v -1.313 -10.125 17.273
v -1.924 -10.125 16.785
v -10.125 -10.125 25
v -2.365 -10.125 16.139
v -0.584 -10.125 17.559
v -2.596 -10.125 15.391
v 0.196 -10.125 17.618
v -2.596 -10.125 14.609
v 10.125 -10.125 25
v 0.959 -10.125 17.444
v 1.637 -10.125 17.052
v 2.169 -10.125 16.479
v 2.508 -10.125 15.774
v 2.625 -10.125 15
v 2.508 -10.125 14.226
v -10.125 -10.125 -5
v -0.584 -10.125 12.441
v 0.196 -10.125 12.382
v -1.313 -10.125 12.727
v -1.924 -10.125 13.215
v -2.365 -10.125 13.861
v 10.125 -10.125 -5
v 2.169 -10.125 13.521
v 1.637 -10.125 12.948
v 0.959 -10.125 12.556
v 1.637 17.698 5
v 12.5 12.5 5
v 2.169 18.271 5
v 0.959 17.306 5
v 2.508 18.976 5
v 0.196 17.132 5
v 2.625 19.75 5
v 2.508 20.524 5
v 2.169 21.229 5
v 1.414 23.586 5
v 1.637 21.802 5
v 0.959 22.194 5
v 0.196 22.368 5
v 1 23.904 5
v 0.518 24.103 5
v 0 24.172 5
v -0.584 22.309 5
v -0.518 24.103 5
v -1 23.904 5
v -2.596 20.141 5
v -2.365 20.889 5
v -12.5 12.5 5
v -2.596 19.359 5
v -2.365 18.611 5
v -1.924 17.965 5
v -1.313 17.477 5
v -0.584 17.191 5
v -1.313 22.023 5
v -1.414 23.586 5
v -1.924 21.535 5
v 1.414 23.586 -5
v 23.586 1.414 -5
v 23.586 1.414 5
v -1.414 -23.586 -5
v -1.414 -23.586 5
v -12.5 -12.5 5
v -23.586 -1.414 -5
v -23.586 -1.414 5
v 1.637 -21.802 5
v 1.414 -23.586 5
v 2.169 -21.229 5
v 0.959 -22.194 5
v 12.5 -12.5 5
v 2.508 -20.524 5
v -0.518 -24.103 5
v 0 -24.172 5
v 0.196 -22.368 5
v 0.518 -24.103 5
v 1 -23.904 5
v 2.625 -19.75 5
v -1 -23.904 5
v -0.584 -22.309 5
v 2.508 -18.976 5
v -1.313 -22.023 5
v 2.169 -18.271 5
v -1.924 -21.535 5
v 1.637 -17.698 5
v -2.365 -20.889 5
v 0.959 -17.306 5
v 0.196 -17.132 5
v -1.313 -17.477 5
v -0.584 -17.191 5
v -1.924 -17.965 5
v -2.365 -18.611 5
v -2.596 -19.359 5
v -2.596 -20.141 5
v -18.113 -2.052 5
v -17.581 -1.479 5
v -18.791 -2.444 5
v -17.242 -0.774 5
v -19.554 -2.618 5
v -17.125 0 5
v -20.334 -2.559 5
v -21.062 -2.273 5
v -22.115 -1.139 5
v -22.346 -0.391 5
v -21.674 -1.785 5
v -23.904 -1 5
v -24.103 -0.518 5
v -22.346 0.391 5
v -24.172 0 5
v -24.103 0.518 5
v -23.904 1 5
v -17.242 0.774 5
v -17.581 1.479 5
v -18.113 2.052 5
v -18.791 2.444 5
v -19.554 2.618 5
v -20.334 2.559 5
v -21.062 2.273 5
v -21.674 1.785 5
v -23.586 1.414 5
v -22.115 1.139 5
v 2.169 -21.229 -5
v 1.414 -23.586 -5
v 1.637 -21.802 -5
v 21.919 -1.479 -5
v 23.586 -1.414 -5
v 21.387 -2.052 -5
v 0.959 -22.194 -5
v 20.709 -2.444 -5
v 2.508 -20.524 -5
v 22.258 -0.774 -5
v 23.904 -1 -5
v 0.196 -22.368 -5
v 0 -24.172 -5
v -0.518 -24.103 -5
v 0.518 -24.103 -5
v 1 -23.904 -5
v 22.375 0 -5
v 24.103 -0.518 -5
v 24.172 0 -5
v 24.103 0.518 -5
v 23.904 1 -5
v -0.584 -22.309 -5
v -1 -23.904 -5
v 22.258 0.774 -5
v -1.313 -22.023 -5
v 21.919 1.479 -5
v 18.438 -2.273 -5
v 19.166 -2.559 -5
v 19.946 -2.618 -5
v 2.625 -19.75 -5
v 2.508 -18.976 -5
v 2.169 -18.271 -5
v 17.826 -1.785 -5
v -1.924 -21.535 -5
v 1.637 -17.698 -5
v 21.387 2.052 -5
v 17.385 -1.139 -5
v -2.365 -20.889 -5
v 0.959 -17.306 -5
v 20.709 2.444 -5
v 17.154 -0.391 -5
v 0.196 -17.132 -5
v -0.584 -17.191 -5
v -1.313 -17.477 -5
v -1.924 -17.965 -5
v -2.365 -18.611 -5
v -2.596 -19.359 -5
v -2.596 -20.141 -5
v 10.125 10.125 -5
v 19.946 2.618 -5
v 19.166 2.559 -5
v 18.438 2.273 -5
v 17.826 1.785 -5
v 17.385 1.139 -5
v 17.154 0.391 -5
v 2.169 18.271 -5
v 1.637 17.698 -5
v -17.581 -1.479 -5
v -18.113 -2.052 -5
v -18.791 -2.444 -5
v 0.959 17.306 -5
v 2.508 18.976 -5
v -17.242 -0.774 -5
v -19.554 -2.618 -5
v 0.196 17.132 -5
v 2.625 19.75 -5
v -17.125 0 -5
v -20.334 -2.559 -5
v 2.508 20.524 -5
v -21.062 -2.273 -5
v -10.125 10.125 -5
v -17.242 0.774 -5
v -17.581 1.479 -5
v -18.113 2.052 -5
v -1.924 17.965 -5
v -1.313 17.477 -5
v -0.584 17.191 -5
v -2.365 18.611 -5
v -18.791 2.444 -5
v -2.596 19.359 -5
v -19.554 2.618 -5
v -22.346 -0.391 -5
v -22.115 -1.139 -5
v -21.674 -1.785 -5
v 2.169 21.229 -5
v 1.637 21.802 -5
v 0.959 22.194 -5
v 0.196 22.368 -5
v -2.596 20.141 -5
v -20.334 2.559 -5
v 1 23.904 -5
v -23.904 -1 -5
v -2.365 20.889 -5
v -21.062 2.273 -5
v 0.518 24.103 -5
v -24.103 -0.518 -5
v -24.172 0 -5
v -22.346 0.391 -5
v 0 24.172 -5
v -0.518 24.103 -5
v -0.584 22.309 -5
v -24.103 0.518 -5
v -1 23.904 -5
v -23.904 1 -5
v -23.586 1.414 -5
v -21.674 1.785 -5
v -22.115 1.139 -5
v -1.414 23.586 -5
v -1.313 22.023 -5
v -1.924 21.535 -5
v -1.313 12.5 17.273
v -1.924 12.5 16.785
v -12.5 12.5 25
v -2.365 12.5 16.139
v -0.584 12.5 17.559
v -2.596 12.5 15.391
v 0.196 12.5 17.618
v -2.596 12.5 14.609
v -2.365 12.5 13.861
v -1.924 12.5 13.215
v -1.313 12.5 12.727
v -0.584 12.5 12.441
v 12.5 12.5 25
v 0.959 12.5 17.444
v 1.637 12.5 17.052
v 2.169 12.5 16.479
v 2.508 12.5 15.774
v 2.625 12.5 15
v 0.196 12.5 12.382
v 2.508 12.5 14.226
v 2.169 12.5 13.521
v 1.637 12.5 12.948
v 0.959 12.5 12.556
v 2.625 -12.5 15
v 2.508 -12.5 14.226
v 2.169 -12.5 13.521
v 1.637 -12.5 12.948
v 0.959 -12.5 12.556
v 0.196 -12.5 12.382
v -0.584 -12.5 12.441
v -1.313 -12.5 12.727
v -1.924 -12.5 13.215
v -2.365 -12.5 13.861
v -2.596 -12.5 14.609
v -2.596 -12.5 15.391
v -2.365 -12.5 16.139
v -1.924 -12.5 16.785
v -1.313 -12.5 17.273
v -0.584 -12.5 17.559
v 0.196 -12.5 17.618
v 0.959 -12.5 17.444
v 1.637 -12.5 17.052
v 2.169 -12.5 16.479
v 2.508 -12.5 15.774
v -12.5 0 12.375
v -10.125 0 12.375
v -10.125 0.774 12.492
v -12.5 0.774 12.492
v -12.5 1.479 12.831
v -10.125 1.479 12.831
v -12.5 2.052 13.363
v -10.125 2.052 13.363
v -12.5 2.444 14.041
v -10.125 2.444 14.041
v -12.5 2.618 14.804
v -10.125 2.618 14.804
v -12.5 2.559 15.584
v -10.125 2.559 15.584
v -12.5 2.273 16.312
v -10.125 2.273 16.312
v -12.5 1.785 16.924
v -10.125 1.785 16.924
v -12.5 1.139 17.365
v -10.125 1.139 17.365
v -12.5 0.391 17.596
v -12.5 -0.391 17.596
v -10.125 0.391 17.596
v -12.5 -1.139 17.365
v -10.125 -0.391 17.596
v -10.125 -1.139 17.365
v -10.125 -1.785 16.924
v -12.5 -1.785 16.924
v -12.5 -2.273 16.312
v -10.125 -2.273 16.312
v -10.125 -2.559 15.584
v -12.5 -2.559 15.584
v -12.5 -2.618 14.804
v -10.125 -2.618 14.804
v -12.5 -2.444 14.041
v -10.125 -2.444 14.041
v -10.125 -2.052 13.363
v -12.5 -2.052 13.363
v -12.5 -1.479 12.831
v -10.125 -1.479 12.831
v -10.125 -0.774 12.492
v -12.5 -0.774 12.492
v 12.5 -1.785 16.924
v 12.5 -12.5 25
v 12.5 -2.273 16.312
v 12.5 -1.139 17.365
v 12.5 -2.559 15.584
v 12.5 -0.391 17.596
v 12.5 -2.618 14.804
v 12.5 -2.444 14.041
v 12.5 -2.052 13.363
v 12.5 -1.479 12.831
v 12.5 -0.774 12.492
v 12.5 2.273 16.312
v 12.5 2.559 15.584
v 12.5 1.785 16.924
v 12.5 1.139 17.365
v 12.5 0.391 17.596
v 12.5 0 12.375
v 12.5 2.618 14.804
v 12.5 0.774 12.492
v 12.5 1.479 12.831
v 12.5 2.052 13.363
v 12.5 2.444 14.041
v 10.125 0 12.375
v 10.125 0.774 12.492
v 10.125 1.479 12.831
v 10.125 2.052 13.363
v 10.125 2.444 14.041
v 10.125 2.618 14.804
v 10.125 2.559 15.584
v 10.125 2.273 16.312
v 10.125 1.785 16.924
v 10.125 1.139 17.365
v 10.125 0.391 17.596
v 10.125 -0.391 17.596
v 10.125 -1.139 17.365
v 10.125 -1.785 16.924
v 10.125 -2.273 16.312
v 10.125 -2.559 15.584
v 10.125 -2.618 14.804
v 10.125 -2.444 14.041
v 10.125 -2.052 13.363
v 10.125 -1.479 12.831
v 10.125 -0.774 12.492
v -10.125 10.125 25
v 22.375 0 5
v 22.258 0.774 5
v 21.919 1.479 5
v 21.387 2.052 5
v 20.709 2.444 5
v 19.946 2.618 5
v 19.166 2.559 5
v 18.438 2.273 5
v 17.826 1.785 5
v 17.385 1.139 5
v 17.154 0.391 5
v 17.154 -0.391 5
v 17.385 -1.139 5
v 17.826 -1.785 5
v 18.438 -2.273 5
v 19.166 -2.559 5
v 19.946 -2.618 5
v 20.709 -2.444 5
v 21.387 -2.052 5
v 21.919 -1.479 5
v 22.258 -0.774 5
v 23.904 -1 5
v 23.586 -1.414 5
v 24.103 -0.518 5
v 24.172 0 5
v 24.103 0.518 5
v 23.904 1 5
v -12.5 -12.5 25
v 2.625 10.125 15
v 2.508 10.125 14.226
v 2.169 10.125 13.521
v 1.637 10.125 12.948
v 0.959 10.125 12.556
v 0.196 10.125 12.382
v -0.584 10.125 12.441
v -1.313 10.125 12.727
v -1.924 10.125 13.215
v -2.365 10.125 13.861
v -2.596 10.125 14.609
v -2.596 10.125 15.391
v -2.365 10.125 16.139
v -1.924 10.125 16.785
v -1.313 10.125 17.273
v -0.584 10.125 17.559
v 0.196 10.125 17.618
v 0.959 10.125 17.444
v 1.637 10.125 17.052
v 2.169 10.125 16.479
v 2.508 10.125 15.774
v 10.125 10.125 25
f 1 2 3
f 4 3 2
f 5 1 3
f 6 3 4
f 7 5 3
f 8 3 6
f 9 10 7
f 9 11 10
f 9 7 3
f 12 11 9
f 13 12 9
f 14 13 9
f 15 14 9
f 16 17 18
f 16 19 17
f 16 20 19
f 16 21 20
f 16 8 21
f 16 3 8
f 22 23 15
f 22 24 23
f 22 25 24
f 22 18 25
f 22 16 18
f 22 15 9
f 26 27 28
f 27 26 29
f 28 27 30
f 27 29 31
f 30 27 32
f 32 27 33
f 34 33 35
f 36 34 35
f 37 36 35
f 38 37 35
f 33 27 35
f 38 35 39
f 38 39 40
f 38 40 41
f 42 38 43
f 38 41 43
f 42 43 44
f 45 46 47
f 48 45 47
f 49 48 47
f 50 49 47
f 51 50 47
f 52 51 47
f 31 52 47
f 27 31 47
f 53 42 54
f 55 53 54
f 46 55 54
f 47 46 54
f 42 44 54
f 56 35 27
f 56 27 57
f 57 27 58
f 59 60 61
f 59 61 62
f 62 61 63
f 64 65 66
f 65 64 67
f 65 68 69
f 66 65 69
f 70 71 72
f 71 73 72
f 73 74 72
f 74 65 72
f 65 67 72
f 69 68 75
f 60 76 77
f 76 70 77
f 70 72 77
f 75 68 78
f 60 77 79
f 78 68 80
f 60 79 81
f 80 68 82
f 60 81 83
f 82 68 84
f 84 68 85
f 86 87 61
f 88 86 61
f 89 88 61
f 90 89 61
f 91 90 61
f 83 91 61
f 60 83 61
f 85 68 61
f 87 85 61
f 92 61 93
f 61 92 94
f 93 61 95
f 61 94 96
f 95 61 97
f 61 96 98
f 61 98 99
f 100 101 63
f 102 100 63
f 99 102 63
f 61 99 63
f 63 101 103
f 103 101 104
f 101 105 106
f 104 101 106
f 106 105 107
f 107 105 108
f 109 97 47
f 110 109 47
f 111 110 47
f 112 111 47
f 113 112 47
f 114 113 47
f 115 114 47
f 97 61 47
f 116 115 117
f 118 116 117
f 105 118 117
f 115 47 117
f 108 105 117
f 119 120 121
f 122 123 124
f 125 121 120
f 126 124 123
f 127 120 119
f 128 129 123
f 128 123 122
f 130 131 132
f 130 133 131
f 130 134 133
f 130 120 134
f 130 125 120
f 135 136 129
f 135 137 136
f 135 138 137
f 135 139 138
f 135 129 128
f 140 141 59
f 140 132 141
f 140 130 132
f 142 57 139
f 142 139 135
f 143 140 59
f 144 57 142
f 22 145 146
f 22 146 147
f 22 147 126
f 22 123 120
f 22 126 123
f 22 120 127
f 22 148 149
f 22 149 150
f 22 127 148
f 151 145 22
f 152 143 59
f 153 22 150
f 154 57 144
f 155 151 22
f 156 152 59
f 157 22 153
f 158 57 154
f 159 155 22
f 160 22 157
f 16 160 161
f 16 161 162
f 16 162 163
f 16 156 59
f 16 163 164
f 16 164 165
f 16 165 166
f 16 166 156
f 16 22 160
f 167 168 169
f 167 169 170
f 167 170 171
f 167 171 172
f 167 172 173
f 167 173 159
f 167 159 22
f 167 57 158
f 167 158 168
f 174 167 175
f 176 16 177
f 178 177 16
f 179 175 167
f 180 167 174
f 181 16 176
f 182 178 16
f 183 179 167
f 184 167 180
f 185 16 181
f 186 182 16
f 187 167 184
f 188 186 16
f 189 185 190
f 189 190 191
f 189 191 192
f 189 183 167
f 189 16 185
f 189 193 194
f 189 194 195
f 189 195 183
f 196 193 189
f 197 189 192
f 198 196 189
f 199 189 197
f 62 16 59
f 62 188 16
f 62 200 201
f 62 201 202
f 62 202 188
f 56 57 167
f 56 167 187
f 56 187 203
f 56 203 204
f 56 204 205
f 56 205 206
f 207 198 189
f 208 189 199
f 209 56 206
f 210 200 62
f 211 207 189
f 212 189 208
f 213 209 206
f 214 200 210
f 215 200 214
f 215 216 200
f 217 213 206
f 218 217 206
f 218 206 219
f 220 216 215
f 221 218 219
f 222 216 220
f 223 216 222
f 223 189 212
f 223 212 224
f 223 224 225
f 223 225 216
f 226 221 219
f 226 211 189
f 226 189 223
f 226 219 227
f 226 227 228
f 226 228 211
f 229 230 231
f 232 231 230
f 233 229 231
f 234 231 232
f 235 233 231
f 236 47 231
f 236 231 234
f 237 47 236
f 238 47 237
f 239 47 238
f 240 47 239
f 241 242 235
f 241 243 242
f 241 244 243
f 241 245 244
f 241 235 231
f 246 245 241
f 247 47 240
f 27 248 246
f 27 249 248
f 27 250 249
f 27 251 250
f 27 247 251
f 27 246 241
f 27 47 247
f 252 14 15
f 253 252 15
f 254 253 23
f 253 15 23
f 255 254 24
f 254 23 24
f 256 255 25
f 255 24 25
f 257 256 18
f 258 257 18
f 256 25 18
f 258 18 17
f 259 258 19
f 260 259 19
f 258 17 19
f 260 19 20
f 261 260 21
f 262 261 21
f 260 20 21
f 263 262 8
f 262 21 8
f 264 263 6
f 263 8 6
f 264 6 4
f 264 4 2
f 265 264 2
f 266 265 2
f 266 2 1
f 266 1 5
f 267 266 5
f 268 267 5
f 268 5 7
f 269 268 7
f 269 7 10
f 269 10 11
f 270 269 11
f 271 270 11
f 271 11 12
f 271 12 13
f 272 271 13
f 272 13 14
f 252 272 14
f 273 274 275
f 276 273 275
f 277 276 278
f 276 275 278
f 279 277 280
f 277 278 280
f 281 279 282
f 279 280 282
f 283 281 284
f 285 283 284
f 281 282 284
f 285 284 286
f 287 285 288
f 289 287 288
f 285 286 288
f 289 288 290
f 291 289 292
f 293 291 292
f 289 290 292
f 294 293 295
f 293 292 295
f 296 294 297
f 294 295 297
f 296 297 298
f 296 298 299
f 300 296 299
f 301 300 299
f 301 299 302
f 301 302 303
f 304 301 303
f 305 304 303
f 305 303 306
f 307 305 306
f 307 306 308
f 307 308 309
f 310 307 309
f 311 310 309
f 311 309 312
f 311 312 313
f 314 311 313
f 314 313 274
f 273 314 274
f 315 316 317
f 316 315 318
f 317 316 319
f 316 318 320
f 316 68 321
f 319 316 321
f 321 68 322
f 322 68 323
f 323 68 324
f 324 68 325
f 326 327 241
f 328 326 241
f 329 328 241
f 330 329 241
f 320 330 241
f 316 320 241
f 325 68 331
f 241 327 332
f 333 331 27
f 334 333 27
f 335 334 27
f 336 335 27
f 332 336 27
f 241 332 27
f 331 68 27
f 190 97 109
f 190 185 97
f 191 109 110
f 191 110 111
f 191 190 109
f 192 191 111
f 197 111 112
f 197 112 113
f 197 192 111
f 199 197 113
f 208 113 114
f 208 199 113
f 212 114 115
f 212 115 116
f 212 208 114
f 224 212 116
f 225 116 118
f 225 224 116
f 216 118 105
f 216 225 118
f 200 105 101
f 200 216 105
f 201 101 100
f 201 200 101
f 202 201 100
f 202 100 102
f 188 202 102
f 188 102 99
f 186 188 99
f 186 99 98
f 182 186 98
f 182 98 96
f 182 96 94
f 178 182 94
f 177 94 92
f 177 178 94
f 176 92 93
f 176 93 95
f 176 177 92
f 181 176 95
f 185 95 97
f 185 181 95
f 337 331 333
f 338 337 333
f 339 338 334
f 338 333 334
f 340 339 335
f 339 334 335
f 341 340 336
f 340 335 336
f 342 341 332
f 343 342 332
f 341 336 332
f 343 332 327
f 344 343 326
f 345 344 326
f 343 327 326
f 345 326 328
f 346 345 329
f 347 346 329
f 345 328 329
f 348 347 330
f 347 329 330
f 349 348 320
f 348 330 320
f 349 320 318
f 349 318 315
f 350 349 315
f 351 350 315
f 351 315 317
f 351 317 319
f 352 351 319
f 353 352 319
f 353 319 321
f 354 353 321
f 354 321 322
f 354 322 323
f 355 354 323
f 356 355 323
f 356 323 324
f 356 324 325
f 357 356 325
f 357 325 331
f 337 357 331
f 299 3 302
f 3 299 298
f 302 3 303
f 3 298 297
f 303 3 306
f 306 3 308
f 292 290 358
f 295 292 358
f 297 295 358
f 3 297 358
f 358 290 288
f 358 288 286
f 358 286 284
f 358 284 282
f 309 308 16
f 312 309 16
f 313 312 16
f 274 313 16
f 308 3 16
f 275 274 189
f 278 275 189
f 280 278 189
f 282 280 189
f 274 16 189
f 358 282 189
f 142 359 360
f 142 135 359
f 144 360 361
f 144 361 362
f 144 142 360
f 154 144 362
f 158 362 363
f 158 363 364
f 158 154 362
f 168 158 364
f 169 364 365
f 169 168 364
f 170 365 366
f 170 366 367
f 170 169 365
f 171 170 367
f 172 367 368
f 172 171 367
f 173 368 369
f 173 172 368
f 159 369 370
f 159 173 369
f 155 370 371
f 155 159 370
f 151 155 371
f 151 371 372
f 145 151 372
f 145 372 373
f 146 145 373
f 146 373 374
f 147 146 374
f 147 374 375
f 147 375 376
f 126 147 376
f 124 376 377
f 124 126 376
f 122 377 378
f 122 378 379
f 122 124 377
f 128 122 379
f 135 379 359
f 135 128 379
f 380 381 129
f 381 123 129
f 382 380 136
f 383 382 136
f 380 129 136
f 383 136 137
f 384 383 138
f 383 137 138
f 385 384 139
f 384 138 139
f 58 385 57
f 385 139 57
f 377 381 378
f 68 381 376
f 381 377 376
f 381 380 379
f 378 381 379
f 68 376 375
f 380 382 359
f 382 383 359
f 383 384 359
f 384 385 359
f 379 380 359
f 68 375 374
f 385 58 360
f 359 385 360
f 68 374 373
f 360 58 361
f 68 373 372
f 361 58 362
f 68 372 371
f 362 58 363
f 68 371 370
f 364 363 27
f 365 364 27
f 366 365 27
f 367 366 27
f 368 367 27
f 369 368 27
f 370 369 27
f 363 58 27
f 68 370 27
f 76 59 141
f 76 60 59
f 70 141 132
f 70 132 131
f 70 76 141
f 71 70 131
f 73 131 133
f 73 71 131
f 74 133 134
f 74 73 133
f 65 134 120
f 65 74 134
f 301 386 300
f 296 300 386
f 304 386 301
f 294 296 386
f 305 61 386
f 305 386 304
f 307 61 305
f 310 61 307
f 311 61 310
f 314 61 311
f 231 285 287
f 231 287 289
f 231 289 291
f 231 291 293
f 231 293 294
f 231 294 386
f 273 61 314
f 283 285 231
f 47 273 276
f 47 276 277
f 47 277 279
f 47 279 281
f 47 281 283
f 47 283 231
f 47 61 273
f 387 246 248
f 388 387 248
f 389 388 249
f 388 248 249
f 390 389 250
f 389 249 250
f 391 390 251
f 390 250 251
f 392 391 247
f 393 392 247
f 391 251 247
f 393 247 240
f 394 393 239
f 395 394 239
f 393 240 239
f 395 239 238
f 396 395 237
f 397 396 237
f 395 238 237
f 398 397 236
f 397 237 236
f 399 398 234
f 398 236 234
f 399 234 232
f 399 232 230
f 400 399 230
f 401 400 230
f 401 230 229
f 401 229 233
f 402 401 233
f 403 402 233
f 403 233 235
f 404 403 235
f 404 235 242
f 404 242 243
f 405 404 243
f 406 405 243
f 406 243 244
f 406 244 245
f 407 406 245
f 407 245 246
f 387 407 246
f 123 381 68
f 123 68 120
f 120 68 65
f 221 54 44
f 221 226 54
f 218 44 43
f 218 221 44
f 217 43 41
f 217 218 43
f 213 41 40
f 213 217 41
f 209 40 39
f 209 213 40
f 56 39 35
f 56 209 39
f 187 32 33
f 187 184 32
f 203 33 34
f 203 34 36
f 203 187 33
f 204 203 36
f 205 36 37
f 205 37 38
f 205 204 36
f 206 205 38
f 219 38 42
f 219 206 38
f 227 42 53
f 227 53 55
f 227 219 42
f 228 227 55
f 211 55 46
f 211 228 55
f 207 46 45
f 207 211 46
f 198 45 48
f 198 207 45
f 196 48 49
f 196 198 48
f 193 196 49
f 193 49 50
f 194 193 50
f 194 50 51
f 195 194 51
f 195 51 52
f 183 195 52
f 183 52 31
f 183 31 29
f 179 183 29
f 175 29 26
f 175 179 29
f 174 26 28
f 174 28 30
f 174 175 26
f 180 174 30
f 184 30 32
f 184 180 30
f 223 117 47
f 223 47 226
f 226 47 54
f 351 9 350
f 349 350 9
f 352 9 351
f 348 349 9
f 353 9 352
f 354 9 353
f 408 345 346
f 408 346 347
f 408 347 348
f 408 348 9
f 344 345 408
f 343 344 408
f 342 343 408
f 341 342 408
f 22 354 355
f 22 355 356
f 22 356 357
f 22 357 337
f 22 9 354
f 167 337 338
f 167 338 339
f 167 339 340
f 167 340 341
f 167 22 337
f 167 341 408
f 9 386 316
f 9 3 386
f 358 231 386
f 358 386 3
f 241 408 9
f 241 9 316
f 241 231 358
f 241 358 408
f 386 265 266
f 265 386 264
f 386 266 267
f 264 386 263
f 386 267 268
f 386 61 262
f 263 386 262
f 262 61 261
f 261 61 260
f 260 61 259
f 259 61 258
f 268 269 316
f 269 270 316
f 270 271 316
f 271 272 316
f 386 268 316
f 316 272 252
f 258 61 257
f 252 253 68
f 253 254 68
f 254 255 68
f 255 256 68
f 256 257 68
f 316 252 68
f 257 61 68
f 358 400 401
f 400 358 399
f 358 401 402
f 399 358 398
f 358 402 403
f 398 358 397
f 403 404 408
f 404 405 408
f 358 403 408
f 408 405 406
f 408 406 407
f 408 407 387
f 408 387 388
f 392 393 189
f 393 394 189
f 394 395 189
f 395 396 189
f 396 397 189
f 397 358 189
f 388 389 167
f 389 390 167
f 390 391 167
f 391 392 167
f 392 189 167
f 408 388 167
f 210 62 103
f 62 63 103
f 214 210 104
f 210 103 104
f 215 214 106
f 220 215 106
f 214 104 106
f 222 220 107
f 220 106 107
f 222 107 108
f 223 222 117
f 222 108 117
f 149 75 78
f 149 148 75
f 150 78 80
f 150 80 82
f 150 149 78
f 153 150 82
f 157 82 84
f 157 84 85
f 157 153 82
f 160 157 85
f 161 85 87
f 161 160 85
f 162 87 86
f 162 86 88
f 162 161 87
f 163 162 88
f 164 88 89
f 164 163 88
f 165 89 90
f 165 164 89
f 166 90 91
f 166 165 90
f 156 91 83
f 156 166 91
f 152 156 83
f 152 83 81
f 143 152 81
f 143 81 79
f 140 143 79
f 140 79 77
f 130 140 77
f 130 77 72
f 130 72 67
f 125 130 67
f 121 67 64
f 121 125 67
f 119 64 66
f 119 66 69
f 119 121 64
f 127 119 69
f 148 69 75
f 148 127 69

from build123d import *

# Parameters (mm, degrees)
SKETCH1_W           = 25
SKETCH1_H           = 25
SKETCH1_W_2         = 20.25
SKETCH1_H_2         = 20.25
BOSS_EXTRUDE1_DEPTH = 5
SKETCH2_R           = 2.625
SKETCH2_W           = 20.25
SKETCH2_H           = 20.25
BOSS_EXTRUDE2_DEPTH = 5
SKETCH3_W           = 25
SKETCH3_H           = 25
SKETCH3_W_2         = 20.25
SKETCH3_H_2         = 20.25
BOSS_EXTRUDE3_DEPTH = 20
SKETCH4_R           = 2.625
CUT_EXTRUDE1_DEPTH  = 38.5
SKETCH5_R           = 2.625
CUT_EXTRUDE2_DEPTH  = 38.5
FILLET1_R           = 2


with BuildPart() as part:
    # Sketch1 → Boss-Extrude1 (new body, symmetric)
    with BuildSketch(Plane.XY):
        Rectangle(SKETCH1_W, SKETCH1_H)
        Rectangle(SKETCH1_W_2, SKETCH1_H_2, mode=Mode.SUBTRACT)
    extrude(amount=BOSS_EXTRUDE1_DEPTH, both=True)

    # Sketch2 → Boss-Extrude2 (add, symmetric)
    with BuildSketch(Plane.XY):
        Polygon((-25, 0), (0, 25), (25, 0), (0, -25), align=None)
        with Locations((0, 19.75)):
            Circle(SKETCH2_R, mode=Mode.SUBTRACT)
        with Locations((19.75, 0)):
            Circle(SKETCH2_R, mode=Mode.SUBTRACT)
        with Locations((0, -19.75)):
            Circle(SKETCH2_R, mode=Mode.SUBTRACT)
        with Locations((-19.75, 0)):
            Circle(SKETCH2_R, mode=Mode.SUBTRACT)
        Rectangle(SKETCH2_W, SKETCH2_H, mode=Mode.SUBTRACT)
    extrude(amount=BOSS_EXTRUDE2_DEPTH, both=True)

    # Sketch3 → Boss-Extrude3 (add)
    with BuildSketch(Plane.XY.offset(5)):
        Rectangle(SKETCH3_W, SKETCH3_H)
        Rectangle(SKETCH3_W_2, SKETCH3_H_2, mode=Mode.SUBTRACT)
    extrude(amount=BOSS_EXTRUDE3_DEPTH)

    # Sketch4 → Cut-Extrude1 (cut, through all)
    with BuildSketch(Plane(origin=(0, 12.5, 0), x_dir=(1, 0, 0), z_dir=(0, 1, 0))):
        with Locations((0, -15)):
            Circle(SKETCH4_R)
    extrude(amount=-CUT_EXTRUDE1_DEPTH, mode=Mode.SUBTRACT)

    # Sketch5 → Cut-Extrude2 (cut, through all)
    with BuildSketch(Plane(origin=(12.5, 0, 0), x_dir=(0, 0, -1), z_dir=(1, 0, 0))):
        with Locations((-15, 0)):
            Circle(SKETCH5_R)
    extrude(amount=-CUT_EXTRUDE2_DEPTH, mode=Mode.SUBTRACT)

    # Fillet1
    fillet1_edges = [part.edges().sort_by_distance(p)[0] for p in [
        (0, -25, 0),
        (25, 0, 0),
        (0, 25, 0),
        (-25, 0, 0),
    ]]
    fillet(fillet1_edges, radius=FILLET1_R)


solid = part.part
